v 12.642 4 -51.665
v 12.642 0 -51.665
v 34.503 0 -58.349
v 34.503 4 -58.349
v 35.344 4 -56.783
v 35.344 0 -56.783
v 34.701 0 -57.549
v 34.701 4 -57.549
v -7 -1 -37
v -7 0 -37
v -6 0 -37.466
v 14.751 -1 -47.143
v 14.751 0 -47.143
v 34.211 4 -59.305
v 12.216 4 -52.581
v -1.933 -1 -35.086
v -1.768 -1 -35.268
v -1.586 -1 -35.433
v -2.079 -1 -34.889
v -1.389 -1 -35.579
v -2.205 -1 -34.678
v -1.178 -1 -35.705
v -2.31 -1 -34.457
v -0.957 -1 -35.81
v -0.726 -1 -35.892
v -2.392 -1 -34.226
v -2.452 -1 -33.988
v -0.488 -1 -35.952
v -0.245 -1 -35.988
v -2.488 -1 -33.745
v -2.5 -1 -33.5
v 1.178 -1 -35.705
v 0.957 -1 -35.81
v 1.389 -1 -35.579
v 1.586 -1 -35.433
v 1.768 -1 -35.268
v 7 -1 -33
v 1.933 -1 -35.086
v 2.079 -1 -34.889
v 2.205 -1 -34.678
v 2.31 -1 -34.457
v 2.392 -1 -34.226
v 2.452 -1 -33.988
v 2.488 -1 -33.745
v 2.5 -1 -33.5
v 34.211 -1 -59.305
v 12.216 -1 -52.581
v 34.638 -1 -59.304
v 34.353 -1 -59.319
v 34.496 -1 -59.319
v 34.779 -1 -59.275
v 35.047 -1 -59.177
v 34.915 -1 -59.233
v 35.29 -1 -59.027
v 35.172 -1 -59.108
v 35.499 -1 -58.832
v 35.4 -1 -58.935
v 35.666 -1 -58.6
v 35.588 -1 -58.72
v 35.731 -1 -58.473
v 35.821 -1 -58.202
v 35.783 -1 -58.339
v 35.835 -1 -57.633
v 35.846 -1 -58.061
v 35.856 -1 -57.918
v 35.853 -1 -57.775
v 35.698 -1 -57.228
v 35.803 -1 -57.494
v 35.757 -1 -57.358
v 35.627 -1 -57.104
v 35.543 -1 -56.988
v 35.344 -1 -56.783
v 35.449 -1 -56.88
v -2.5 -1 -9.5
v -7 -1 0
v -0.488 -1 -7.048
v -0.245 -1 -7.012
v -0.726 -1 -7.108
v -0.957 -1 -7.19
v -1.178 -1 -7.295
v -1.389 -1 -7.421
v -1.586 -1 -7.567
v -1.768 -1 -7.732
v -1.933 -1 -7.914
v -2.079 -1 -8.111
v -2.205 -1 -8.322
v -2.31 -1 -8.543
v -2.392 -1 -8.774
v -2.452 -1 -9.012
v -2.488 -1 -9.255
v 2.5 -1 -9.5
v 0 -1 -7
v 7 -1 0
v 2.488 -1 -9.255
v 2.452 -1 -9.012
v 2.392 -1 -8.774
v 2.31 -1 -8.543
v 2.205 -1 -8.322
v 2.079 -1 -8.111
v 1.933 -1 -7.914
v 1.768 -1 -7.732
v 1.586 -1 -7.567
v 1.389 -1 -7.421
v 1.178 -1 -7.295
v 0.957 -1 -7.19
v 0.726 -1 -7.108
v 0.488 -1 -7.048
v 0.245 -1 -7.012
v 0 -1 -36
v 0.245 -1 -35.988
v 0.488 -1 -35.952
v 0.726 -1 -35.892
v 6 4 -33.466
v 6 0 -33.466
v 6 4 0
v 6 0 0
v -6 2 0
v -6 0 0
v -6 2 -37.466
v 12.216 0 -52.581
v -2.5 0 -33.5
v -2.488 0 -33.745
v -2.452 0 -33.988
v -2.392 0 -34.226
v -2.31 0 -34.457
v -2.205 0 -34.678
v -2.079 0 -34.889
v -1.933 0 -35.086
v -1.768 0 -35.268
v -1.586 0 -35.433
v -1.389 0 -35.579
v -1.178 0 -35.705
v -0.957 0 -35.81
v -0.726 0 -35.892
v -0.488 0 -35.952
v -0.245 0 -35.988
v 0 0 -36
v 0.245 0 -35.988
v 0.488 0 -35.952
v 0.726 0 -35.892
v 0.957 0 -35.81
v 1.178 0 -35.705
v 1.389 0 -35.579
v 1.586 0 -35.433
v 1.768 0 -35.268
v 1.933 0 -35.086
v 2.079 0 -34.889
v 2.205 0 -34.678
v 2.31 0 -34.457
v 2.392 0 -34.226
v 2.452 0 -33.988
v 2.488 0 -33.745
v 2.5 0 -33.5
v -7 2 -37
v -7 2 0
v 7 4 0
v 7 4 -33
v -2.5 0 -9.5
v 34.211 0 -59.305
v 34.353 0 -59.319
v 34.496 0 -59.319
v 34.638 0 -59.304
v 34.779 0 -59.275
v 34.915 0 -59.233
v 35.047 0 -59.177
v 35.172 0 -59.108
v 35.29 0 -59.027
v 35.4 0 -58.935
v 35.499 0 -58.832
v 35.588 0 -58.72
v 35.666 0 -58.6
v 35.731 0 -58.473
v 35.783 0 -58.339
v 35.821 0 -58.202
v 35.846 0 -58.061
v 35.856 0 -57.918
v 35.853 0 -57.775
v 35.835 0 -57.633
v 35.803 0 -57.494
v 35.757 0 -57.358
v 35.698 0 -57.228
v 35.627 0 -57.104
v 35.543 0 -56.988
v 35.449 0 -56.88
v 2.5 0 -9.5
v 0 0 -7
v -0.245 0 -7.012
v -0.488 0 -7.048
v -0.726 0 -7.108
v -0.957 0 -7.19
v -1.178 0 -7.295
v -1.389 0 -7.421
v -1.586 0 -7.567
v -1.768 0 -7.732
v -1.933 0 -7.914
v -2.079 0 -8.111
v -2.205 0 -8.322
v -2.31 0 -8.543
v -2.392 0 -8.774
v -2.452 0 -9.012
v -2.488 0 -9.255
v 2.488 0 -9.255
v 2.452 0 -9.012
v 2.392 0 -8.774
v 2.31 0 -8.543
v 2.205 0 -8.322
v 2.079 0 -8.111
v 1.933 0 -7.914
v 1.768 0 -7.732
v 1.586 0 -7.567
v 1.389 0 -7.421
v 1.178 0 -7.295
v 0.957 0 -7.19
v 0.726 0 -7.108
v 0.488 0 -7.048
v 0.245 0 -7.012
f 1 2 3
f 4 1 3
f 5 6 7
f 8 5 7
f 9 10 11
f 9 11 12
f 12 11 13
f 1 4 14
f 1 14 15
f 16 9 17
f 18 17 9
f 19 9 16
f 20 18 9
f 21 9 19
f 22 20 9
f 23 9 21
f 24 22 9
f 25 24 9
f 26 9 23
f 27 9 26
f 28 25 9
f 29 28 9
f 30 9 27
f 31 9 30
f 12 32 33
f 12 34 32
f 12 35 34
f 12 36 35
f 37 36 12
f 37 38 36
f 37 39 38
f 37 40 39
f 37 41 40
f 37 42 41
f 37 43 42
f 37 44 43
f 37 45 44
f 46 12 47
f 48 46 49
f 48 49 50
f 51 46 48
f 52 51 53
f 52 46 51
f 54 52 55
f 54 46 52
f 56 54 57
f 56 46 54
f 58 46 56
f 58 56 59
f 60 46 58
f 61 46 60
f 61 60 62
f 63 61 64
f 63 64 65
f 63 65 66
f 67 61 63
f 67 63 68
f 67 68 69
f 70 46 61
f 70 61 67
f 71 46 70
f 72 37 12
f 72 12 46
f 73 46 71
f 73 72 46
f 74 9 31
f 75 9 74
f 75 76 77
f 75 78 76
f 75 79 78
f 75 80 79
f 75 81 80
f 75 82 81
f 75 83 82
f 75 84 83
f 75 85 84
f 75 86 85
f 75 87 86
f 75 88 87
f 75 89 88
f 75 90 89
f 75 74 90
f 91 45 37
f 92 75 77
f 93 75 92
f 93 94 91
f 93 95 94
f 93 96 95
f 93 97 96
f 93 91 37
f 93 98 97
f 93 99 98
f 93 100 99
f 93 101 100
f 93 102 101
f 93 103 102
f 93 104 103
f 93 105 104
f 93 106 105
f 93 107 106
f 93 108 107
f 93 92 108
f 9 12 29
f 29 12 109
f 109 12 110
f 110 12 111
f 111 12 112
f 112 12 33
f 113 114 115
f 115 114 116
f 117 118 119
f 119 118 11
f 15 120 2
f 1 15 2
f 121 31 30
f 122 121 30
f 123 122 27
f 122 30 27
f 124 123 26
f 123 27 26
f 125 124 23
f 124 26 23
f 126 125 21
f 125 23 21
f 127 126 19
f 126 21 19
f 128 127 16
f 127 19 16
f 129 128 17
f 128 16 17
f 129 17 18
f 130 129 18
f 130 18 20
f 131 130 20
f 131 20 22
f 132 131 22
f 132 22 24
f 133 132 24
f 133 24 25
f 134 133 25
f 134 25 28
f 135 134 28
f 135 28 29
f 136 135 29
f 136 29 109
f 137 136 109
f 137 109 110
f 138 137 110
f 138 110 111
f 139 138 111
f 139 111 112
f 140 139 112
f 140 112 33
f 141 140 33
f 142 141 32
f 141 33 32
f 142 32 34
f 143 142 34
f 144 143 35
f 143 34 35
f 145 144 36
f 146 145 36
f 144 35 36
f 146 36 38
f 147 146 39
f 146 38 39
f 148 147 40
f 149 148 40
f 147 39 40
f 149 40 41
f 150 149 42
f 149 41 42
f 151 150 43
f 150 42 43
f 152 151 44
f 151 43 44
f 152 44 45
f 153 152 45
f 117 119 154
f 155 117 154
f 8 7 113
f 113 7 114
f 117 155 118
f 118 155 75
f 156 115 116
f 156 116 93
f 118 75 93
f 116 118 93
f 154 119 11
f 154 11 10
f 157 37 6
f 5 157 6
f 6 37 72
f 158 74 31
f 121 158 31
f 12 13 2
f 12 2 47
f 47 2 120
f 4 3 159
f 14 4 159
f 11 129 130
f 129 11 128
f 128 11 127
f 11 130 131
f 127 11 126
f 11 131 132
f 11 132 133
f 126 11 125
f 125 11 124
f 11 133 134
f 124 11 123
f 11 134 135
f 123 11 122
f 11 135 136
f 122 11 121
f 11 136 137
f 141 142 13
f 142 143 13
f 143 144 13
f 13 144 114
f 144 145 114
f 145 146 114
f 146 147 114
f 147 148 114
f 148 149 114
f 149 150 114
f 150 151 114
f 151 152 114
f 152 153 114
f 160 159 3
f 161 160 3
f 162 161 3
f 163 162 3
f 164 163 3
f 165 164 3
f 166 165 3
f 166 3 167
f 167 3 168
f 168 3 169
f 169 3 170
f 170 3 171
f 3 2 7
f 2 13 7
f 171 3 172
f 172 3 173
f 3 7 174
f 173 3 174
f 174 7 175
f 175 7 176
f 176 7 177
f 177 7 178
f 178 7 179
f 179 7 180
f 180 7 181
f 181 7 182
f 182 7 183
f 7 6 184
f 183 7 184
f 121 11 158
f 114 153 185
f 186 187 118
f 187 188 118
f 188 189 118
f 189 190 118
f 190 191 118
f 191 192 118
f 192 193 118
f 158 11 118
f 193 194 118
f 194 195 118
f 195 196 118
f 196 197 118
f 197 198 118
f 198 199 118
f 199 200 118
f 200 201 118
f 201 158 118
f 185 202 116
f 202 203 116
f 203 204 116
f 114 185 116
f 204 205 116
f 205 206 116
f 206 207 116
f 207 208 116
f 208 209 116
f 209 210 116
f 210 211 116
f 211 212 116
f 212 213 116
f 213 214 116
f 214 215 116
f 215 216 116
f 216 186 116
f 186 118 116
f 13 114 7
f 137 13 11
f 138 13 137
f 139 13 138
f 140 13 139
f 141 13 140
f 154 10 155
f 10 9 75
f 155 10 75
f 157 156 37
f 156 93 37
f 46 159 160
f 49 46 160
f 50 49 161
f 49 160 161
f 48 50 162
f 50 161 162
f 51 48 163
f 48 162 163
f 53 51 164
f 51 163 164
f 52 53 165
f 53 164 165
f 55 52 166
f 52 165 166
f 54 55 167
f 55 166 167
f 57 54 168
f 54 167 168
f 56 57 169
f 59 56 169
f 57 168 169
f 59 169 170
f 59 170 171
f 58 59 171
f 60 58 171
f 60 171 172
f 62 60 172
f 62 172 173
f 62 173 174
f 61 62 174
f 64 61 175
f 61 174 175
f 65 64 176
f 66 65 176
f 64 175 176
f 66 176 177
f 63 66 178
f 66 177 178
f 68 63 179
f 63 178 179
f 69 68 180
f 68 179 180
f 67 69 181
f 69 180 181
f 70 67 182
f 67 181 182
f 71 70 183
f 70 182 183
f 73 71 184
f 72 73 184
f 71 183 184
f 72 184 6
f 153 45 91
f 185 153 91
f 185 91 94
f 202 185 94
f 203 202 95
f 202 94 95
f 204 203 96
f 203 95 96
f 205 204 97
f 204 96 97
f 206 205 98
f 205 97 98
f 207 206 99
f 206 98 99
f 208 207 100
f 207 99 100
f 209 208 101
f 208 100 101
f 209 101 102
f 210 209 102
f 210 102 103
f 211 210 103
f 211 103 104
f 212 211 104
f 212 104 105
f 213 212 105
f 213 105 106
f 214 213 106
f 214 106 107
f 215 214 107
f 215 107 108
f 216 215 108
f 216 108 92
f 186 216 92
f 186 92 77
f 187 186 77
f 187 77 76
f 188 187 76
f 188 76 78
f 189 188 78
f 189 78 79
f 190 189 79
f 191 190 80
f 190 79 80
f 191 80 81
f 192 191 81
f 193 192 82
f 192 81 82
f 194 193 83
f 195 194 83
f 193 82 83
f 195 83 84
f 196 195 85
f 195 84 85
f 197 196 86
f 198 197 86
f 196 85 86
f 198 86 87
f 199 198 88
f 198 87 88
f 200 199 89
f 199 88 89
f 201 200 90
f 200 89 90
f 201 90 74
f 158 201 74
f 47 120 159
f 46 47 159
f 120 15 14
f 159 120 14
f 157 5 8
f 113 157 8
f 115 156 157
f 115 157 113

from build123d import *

# Parameters (mm, degrees)
F1_DEPTH = 1
F3_DEPTH = 2
F5_DEPTH = 4
F7_DEPTH = 25


with BuildPart() as f1:
    # F0 (on Front) → F1 (new body)
    with BuildSketch(Plane.XZ):
        with BuildLine():
            Line((7, -33), (7, 0))
            Line((7, 0), (-7, 0))
            Line((-7, 0), (-7, -37))
            Line((-7, -37), (14.751387, -47.142838))
            Line((14.751387, -47.142838), (12.215677, -52.580685))
            Line((12.215677, -52.580685), (34.210687, -59.305234))
            ThreePointArc((34.210687, -59.305234), (35.730719, -58.472537), (35.343644, -56.783142))
            Line((35.343644, -56.783142), (7, -33))
        make_face()
    extrude(amount=F1_DEPTH)

    # F2 (on face) → F3 (join)
    with BuildSketch(Plane(origin=(0, 0, 0), x_dir=(-1, 0, 0), z_dir=(0, 1, 0))):
        Polygon((7, -37), (7, 0), (6, 0), (6, -37.466308), align=None)
    extrude(amount=F3_DEPTH)

    # F4 (on face) → F5 (join)
    with BuildSketch(Plane(origin=(0, 0, 0), x_dir=(-1, 0, 0), z_dir=(0, 1, 0))):
        Polygon((-34.700857, -57.549186), (-6, -33.466308), (-6, 0), (-7, 0), (-7, -33), (-35.343644, -56.783142), align=None)
        Polygon((-12.215677, -52.580685), (-12.642449, -51.66547), (-34.503058, -58.348929), (-34.210687, -59.305234), align=None)
    extrude(amount=F5_DEPTH)

    # F6 (on face) → F7 (cut)
    with BuildSketch(Plane.XZ.offset(1)):
        with BuildLine():
            ThreePointArc((2.5, -9.5), (0, -7), (-2.5, -9.5))
            Line((-2.5, -9.5), (-2.5, -33.5))
            ThreePointArc((-2.5, -33.5), (0, -36), (2.5, -33.5))
            Line((2.5, -33.5), (2.5, -9.5))
        make_face()
    extrude(amount=-F7_DEPTH, mode=Mode.SUBTRACT)


solid = f1.part
